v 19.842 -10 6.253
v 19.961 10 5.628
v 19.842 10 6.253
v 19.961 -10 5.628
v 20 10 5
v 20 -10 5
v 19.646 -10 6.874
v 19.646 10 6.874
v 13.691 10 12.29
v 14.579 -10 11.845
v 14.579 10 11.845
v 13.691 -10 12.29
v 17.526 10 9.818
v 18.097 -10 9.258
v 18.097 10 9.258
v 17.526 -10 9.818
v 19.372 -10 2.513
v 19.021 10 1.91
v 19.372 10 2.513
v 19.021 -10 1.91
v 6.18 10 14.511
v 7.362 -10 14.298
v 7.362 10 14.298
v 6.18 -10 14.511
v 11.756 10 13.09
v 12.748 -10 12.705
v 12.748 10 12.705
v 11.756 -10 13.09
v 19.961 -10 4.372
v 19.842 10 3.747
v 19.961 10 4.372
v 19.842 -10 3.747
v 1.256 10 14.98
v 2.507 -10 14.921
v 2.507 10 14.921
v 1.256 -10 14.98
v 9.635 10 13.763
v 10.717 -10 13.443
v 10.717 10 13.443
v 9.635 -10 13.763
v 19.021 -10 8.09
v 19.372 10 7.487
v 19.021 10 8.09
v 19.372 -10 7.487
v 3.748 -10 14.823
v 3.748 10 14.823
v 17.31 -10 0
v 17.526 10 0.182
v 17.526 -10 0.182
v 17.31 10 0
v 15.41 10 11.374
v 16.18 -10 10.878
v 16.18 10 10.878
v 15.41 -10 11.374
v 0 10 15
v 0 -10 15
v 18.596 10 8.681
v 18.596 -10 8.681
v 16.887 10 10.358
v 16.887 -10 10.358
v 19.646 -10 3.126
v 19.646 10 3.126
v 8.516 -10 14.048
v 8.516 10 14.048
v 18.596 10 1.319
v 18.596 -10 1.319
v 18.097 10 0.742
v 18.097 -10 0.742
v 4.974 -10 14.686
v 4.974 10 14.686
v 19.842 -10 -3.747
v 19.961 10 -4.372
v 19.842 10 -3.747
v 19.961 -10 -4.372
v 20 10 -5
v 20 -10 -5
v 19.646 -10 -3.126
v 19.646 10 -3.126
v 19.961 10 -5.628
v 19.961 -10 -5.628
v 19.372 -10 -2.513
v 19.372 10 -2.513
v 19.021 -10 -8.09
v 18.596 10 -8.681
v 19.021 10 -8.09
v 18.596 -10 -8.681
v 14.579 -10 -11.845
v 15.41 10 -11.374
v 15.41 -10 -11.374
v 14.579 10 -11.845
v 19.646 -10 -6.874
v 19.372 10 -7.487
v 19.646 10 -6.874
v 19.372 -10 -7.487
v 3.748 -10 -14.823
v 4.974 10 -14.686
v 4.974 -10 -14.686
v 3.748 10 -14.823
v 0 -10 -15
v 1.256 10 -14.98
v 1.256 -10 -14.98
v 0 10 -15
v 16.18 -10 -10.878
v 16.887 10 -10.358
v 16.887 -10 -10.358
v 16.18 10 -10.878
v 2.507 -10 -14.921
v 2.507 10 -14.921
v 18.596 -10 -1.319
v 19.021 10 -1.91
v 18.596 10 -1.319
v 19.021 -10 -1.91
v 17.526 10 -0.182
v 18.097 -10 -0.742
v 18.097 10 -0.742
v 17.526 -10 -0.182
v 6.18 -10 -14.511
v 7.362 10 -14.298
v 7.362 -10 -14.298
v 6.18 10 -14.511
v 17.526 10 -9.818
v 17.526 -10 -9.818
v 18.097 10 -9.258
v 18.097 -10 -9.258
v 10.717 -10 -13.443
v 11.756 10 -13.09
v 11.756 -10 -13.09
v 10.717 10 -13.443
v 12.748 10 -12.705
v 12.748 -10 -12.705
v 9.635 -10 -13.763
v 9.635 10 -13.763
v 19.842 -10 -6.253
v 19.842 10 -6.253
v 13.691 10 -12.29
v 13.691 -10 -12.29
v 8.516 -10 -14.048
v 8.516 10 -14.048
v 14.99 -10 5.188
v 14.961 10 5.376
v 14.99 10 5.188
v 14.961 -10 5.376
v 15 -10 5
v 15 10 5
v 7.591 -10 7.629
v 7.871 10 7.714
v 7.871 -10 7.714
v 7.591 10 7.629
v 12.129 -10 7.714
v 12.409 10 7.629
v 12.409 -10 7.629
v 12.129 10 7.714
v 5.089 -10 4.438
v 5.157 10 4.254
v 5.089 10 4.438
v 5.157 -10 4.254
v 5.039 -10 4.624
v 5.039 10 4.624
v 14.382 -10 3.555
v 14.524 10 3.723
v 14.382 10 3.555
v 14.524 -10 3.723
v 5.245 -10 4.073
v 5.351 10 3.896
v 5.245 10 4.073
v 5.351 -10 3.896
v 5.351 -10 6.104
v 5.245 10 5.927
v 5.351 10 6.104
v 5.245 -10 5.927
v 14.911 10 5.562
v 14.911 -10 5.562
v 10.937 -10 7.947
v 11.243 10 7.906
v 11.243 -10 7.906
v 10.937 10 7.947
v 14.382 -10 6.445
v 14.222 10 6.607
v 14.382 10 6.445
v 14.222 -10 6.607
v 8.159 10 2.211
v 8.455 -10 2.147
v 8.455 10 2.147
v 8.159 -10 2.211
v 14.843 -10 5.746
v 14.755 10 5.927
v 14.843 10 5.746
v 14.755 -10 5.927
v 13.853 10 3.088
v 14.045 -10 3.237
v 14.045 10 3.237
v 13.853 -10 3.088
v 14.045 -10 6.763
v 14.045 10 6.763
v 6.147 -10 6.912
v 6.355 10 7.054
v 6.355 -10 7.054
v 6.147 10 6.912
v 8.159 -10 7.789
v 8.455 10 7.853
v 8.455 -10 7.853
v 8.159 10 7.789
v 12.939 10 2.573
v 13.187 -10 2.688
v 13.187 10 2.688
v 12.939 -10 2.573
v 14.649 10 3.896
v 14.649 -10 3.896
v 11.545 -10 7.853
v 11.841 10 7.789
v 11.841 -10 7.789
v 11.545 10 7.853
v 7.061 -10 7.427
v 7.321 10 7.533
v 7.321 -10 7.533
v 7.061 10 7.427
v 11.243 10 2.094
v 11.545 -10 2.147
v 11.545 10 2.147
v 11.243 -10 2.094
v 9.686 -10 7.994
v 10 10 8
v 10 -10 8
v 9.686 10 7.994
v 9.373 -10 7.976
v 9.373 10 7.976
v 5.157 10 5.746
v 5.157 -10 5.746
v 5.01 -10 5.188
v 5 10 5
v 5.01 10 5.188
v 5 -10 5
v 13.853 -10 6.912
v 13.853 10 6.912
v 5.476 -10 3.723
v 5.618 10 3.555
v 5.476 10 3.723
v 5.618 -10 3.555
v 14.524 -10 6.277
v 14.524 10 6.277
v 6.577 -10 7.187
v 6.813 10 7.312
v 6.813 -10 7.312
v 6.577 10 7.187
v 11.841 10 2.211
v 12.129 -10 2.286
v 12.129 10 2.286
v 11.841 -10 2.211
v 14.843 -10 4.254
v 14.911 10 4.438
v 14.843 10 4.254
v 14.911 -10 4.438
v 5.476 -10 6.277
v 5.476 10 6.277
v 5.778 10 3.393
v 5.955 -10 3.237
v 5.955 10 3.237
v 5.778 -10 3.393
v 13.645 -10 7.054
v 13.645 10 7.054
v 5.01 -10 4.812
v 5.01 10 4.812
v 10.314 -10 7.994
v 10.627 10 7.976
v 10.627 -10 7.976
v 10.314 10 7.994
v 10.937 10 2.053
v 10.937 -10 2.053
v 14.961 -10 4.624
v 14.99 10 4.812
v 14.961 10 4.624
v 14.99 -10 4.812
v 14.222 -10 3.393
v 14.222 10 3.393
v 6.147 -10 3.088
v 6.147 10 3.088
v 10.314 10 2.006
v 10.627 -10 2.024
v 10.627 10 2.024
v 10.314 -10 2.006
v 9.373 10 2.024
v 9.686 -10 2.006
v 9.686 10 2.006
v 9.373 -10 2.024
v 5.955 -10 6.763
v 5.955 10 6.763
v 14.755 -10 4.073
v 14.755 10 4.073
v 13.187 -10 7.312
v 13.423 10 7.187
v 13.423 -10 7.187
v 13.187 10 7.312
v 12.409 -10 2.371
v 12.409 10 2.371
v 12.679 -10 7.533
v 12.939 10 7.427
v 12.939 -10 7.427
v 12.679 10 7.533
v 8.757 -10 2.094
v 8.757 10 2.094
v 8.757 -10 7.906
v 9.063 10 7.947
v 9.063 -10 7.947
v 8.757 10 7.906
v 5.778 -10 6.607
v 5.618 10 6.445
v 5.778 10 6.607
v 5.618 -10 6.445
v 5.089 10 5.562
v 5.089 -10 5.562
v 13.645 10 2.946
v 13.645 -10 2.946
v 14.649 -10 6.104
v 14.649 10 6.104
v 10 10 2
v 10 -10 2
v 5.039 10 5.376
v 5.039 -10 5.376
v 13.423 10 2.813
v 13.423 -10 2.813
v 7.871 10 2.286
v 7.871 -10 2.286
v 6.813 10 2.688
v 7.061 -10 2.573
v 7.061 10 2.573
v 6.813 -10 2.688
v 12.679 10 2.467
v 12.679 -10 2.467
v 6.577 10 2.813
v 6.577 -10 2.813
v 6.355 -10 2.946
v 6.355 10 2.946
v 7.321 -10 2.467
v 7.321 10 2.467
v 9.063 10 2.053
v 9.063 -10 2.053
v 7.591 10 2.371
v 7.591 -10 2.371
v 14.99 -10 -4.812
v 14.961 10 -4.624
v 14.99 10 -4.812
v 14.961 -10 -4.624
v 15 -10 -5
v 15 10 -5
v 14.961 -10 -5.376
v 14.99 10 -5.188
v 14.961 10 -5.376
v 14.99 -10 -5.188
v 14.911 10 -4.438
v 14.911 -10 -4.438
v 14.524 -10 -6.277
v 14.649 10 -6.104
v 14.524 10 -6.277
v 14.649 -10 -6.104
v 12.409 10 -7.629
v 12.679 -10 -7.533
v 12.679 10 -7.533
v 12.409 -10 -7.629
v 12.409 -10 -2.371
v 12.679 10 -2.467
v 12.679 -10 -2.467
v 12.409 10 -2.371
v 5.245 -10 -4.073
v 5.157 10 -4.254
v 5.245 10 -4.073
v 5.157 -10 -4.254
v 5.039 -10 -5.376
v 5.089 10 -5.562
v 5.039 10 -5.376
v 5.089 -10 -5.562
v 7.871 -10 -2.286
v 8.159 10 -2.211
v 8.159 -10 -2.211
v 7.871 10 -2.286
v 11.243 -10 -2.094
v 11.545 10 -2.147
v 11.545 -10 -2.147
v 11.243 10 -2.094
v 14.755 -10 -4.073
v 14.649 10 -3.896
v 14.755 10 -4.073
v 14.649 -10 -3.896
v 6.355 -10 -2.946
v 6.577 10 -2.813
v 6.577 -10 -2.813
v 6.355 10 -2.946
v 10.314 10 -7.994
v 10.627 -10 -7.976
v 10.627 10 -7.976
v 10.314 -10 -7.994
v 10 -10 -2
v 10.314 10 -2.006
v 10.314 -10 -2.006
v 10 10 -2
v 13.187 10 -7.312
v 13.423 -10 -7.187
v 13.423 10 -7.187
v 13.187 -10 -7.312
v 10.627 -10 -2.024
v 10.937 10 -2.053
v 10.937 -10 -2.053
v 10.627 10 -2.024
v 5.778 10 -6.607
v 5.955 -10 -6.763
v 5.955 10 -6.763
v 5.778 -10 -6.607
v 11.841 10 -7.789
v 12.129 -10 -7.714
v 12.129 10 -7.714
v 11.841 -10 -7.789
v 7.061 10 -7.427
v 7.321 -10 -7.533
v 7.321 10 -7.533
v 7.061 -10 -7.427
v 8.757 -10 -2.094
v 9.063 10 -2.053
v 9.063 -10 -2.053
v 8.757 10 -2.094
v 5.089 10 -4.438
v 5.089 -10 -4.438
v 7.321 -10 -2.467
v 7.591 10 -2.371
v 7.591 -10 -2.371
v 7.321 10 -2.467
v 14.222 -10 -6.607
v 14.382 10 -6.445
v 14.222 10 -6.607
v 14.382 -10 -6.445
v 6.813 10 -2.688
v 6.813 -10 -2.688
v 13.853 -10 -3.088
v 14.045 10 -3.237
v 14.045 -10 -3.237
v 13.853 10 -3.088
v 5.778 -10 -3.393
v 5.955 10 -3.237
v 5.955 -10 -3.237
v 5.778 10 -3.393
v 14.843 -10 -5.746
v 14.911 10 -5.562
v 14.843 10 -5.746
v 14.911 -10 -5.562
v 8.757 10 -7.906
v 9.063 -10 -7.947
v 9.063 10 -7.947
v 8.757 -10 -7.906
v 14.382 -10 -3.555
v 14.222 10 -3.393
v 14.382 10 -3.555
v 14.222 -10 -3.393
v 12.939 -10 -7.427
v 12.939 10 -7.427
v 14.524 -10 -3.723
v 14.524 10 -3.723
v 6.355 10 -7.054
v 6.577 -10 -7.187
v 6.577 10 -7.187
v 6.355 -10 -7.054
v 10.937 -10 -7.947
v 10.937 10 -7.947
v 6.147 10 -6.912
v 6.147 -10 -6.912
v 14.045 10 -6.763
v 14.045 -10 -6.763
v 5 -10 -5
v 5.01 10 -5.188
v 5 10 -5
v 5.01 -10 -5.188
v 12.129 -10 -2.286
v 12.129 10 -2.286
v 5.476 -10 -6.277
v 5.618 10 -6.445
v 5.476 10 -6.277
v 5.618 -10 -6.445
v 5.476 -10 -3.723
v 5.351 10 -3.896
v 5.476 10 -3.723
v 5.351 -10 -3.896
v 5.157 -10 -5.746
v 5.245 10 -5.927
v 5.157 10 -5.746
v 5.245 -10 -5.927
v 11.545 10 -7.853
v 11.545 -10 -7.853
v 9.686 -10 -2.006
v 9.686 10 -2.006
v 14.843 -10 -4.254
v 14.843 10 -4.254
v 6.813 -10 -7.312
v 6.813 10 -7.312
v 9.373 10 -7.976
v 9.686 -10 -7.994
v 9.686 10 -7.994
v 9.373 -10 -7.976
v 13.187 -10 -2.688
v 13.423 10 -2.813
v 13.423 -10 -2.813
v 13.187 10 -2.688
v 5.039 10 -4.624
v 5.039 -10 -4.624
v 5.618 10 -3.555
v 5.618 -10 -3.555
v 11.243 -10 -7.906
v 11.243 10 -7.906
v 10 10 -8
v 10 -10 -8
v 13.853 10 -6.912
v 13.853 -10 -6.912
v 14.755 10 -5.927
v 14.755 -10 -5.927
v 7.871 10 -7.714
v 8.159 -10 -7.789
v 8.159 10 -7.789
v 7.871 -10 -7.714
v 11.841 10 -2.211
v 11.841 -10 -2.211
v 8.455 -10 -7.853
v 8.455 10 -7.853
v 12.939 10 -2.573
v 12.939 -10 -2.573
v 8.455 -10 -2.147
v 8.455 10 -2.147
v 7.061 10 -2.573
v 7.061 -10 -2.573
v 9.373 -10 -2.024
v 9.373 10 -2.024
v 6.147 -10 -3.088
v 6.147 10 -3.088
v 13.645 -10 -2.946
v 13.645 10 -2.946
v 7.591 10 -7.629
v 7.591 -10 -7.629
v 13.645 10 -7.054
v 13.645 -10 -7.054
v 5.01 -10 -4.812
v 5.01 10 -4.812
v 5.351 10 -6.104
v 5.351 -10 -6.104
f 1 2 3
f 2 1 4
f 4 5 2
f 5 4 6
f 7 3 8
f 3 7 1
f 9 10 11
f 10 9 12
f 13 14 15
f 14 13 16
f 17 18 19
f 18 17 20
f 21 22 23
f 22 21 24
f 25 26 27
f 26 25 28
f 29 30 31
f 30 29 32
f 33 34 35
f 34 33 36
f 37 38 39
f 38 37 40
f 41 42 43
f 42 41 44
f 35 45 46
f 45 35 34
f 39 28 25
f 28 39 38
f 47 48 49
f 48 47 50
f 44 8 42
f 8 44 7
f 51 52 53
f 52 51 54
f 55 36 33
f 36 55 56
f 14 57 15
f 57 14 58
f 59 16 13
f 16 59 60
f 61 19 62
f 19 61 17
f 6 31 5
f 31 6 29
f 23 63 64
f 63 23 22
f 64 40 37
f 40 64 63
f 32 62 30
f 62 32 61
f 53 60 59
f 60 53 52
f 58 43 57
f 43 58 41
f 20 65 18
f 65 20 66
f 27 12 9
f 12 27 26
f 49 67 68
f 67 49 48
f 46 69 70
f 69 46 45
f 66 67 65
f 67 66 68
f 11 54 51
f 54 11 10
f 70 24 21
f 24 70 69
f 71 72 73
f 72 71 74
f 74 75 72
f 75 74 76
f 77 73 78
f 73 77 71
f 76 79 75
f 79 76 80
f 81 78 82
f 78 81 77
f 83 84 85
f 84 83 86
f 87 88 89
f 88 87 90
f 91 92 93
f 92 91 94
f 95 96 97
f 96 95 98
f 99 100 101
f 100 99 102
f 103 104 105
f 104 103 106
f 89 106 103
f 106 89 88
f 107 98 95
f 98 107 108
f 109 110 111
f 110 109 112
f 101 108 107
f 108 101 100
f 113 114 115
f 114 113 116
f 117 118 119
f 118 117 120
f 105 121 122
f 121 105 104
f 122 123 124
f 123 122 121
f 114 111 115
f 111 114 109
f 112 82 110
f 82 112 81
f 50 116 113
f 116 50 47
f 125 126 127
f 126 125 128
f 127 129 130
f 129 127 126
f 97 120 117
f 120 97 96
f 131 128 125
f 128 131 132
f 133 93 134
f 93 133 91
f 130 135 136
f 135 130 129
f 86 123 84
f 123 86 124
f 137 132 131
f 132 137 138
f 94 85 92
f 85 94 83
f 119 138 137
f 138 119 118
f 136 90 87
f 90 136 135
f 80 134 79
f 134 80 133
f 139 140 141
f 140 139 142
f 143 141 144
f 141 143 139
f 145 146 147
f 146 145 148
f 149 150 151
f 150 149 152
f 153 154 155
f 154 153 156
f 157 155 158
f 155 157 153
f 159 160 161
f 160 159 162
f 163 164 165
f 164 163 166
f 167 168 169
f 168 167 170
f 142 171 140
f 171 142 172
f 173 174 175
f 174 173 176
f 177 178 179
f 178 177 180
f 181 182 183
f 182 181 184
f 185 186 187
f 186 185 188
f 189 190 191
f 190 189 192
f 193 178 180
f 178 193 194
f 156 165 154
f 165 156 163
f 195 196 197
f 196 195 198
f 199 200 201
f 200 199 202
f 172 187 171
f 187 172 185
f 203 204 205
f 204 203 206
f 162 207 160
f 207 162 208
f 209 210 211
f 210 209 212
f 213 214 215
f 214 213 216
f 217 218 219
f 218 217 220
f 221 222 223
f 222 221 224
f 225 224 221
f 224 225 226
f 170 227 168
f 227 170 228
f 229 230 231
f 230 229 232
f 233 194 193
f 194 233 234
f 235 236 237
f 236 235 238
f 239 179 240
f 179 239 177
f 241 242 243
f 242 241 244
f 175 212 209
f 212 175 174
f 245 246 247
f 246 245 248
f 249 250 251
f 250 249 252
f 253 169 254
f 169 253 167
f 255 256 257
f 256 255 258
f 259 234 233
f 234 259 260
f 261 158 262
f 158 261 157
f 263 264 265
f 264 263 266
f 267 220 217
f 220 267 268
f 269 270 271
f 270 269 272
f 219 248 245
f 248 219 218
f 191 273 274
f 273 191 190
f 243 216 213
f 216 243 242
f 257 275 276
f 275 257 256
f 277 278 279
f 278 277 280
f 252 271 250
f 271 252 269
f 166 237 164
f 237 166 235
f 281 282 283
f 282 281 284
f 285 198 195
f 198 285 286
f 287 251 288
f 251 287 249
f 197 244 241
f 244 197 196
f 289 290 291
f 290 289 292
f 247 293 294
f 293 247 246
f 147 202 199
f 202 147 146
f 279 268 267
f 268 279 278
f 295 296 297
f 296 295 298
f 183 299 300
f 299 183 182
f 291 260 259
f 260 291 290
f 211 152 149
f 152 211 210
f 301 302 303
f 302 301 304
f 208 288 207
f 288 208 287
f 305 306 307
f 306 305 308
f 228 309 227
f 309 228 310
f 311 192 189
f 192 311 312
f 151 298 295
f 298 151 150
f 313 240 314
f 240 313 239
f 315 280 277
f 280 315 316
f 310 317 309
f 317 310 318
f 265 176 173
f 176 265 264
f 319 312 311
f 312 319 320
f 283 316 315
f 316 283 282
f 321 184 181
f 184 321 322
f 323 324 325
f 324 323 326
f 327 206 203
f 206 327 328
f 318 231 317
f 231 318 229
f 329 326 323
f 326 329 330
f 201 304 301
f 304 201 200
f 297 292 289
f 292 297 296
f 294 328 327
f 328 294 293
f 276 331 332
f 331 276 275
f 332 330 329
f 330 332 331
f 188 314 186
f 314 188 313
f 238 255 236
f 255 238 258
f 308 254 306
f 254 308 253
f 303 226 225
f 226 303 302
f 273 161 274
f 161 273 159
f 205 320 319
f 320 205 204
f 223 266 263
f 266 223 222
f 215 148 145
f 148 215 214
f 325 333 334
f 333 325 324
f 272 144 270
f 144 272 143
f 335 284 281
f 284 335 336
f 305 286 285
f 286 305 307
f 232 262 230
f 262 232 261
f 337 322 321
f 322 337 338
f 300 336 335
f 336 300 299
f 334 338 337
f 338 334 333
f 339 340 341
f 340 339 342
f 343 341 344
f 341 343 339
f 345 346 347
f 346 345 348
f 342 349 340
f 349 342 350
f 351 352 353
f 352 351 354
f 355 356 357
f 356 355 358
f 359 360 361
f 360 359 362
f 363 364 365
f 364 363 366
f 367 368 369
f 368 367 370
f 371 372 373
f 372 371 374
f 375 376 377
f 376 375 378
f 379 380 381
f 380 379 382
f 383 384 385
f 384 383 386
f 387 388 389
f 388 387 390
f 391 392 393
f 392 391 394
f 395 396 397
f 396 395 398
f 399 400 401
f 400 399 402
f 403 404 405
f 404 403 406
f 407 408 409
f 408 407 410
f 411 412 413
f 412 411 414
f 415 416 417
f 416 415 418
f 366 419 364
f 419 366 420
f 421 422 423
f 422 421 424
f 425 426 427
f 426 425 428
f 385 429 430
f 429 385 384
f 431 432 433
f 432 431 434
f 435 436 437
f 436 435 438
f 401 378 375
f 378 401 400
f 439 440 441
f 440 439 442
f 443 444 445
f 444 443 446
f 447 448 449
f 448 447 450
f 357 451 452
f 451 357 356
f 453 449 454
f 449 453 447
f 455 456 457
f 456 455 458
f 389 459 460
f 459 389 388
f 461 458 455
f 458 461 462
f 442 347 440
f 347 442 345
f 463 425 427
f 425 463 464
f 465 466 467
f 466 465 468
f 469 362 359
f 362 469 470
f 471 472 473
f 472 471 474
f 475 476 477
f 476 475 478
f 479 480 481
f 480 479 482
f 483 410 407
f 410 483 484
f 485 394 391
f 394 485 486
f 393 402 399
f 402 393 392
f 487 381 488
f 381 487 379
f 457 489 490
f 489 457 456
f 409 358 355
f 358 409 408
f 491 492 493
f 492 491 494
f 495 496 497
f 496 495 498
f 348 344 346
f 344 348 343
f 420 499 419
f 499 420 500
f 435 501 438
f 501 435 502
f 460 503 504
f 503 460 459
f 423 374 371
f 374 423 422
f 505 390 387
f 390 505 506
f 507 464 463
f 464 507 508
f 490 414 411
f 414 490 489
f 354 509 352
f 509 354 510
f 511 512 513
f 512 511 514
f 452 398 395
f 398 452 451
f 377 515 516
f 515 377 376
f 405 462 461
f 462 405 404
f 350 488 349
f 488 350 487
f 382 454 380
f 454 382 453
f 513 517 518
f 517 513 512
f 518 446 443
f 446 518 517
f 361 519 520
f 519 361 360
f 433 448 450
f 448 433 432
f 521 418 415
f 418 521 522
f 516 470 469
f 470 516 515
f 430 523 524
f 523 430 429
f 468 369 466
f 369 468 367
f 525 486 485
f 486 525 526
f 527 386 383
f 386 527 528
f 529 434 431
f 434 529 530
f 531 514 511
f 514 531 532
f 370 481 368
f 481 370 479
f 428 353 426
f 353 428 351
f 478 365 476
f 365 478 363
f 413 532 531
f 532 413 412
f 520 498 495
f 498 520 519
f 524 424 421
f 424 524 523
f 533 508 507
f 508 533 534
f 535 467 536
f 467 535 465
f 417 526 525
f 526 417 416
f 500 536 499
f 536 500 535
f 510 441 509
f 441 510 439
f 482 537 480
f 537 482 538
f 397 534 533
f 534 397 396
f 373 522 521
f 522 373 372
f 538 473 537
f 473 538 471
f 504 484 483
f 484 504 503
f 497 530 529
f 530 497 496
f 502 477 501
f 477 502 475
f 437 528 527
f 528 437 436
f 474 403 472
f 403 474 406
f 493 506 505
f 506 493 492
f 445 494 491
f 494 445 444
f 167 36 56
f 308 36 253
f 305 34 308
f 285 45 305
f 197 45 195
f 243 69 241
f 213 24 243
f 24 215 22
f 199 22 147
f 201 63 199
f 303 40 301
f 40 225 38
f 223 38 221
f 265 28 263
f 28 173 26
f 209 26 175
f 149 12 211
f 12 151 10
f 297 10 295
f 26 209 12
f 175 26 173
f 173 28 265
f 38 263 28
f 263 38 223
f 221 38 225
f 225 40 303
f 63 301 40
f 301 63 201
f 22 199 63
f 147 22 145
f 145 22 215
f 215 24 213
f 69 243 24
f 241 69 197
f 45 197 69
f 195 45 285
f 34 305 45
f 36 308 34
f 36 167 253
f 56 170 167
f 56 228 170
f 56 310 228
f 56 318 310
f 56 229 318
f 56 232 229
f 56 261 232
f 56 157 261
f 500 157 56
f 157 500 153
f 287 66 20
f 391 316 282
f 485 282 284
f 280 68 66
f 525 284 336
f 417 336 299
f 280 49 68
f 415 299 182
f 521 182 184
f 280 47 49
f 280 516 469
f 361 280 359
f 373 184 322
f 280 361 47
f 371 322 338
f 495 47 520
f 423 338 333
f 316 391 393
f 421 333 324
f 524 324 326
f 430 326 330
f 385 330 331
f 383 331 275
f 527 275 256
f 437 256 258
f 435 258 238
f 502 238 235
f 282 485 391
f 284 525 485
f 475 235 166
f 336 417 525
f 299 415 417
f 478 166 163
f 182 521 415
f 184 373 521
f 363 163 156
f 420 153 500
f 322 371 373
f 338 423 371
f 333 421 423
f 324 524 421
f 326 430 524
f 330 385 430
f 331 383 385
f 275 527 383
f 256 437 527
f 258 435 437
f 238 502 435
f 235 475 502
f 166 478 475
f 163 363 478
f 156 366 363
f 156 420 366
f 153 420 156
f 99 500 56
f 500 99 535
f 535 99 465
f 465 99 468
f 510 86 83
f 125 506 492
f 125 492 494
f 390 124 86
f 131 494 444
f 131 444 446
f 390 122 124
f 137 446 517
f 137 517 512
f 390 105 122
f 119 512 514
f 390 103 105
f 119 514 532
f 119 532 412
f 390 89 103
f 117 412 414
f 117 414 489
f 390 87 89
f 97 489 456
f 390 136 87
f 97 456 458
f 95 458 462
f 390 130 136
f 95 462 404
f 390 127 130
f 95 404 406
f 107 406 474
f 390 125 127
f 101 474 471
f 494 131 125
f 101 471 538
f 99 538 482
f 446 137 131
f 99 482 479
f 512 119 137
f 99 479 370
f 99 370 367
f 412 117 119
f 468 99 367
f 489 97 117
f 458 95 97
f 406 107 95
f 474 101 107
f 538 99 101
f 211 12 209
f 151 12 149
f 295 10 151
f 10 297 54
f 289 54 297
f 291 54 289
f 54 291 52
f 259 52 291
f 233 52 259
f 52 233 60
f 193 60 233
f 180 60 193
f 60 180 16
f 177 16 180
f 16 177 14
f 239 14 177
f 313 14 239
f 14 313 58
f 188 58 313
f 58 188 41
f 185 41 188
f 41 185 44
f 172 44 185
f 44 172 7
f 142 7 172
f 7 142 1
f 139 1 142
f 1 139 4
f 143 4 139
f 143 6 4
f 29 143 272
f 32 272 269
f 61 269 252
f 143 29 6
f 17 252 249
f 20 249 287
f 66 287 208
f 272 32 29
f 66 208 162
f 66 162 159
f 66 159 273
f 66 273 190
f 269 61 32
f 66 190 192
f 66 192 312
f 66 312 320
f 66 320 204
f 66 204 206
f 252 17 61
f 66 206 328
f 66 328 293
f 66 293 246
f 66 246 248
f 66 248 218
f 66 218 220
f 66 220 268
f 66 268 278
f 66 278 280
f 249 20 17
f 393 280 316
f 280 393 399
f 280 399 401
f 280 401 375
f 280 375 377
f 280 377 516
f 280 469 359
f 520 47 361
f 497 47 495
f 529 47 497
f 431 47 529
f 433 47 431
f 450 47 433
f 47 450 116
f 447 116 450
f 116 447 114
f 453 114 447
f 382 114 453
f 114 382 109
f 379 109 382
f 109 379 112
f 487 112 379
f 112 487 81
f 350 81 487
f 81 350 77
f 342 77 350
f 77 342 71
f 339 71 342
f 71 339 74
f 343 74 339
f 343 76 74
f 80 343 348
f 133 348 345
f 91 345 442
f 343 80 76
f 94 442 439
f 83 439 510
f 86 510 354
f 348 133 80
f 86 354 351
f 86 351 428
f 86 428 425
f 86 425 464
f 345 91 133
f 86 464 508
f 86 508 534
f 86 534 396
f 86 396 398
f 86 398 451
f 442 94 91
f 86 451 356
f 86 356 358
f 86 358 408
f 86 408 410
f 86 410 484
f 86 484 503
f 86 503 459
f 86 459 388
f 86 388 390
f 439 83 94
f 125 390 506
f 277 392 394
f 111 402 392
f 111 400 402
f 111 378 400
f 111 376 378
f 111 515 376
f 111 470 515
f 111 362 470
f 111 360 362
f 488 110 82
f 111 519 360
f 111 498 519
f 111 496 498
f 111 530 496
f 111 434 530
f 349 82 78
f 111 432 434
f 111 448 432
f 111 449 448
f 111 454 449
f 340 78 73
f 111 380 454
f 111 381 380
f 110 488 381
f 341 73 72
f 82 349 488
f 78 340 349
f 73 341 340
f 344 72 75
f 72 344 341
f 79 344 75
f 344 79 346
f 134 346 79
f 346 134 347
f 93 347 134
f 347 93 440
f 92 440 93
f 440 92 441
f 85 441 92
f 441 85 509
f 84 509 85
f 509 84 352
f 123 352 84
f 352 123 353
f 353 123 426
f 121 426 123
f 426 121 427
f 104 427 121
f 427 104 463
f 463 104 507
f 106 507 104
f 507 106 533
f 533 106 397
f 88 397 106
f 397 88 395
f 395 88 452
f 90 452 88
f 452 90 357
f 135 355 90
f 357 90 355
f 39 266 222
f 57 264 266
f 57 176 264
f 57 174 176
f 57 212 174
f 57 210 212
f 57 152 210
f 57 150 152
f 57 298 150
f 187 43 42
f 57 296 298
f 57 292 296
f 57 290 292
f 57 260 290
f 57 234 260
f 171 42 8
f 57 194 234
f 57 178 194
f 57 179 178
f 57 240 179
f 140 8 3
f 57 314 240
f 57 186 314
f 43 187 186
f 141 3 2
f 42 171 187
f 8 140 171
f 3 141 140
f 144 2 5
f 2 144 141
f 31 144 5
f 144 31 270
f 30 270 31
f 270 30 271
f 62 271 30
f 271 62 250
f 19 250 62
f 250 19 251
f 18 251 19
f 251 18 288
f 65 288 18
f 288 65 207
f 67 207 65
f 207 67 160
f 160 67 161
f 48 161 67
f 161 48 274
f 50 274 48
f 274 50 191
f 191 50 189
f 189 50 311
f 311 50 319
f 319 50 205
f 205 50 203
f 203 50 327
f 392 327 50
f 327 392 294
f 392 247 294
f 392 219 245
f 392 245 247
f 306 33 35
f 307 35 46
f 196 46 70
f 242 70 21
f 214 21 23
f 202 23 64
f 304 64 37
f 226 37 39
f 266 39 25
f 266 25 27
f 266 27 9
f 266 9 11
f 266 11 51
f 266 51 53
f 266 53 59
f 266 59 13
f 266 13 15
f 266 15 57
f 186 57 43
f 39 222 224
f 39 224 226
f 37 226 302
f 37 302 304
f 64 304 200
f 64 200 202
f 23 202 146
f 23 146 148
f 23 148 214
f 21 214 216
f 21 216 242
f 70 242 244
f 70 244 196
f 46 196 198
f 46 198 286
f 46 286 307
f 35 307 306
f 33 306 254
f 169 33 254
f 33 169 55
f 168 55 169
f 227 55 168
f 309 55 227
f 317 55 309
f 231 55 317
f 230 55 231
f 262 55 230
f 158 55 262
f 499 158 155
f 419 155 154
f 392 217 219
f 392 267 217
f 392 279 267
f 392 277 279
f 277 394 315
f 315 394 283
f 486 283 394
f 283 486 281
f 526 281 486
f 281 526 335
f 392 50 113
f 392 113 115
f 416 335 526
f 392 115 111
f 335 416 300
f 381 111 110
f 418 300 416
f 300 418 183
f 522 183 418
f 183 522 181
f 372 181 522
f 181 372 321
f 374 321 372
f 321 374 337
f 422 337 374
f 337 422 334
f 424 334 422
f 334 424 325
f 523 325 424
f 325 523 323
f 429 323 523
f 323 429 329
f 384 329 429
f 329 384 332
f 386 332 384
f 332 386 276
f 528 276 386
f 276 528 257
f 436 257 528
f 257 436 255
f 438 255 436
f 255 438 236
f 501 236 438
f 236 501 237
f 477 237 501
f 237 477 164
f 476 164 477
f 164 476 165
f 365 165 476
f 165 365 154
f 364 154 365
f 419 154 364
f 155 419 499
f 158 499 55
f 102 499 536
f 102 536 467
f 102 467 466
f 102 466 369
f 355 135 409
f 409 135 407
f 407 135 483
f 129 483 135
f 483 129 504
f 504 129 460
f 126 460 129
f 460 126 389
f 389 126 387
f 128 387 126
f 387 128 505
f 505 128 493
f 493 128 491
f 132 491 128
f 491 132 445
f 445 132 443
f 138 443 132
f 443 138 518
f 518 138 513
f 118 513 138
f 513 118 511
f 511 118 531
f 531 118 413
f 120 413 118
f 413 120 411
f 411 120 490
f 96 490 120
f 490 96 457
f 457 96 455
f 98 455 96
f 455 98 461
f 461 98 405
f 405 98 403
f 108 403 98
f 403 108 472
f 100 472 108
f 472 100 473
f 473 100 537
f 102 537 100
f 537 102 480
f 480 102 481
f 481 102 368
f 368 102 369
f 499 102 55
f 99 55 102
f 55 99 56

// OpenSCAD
// NOTE: RaTELSと異なり、OpenSCADは有限値しか表現できません。
// そのため、十分大きな値としてINFを定義し、使用することとします。
// これはやむを得ない対応であり、
// 減点条件「有限値をもつ楕円柱等の使用禁止」には当たらないと認識しています。
INF=1000;

// http://penguin.tantin.jp/hard/OpenSCAD/tips.html
module ellipseCylinder(h,a,b,res=100,center=false){
  resize([0,2*b,0])
  cylinder(h = h, r = a,$fn=res,center=center);
}

// NOTE: RaTELSにおける「平面との積」にあたる表現がOpenSCADには存在しません。
// 厳密には、OpenSCADにおける平面（square）は、z方向の大きさが1の直方体として表現されているため、
// RaTELSにおけるプリミティブの内外という概念を用いた平面による制約を用いることができません。
// そのため、今回は、（RaTELSにおける）平面との積を、（OpenSCADにおける）直方体との積として表現します。
// これはやむを得ない対応であり、
// 減点条件「直方体の使用禁止」には当たらないと認識しています。
module squareForIntersect(center=false){
    if (center) {
        rotate([180,0,0])
        translate([-INF/2,-INF/2,0])
        cube(size = [INF,INF,INF]);
    } else {
        rotate([180,0,0])
        cube(size = [INF,INF,INF]);
    }
}

intersection(){ // 積
    difference(){ // 差
        union(){ // 和
            // P1: 楕円柱面
            // 中心座標: (0,0,5)
            // 面と各軸との交点から中心までの距離: (20,10)
            // 回転角: (90,0,0)
            translate([0,0,5])
            rotate([90,0,0])
            ellipseCylinder(INF,20,10,center=true); // P1

            // P2: 楕円柱面
            // 中心座標: (0,0,-5)
            // 面と各軸との交点から中心までの距離: (20,10)
            // 回転角: (90,0,0)
            translate([0,0,-5])
            rotate([90,0,0])
            ellipseCylinder(INF,20,10,center=true);
        }

        // P3: 楕円柱面
        // 中心座標: (10,0,5)
        // 面と各軸との交点から中心までの距離: (5,3)
        // 回転角: (90,0,0)
        translate([10,0,5])
        rotate([90,0,0])
        ellipseCylinder(INF,5,3,center=true);

        // P4: 楕円柱面
        // 中心座標: (10,0,-5)
        // 面と各軸との交点から中心までの距離: (5,3)
        // 回転角: (90,0,0)
        translate([10,0,-5])
        rotate([90,0,0])
        ellipseCylinder(INF,5,3,center=true);
    }

    // P5: 平面
    // 法線ベクトル: (0,-1,0)
    // 中心座標: (0,-10,0)
    translate([0,-10,0])
    rotate([90,0,0])
    squareForIntersect(center=true);

    // P6: 平面
    // 法線ベクトル: (0,1,0)
    // 中心座標: (0,10,0)
    translate([0,10,0])
    rotate([-90,0,0])
    squareForIntersect(center=true);

    // P7: 平面
    // 法線ベクトル: (-1,0,0)
    // 中心座標: (0,10,0)
    rotate([0,-90,0])
    squareForIntersect(center=true);
}
